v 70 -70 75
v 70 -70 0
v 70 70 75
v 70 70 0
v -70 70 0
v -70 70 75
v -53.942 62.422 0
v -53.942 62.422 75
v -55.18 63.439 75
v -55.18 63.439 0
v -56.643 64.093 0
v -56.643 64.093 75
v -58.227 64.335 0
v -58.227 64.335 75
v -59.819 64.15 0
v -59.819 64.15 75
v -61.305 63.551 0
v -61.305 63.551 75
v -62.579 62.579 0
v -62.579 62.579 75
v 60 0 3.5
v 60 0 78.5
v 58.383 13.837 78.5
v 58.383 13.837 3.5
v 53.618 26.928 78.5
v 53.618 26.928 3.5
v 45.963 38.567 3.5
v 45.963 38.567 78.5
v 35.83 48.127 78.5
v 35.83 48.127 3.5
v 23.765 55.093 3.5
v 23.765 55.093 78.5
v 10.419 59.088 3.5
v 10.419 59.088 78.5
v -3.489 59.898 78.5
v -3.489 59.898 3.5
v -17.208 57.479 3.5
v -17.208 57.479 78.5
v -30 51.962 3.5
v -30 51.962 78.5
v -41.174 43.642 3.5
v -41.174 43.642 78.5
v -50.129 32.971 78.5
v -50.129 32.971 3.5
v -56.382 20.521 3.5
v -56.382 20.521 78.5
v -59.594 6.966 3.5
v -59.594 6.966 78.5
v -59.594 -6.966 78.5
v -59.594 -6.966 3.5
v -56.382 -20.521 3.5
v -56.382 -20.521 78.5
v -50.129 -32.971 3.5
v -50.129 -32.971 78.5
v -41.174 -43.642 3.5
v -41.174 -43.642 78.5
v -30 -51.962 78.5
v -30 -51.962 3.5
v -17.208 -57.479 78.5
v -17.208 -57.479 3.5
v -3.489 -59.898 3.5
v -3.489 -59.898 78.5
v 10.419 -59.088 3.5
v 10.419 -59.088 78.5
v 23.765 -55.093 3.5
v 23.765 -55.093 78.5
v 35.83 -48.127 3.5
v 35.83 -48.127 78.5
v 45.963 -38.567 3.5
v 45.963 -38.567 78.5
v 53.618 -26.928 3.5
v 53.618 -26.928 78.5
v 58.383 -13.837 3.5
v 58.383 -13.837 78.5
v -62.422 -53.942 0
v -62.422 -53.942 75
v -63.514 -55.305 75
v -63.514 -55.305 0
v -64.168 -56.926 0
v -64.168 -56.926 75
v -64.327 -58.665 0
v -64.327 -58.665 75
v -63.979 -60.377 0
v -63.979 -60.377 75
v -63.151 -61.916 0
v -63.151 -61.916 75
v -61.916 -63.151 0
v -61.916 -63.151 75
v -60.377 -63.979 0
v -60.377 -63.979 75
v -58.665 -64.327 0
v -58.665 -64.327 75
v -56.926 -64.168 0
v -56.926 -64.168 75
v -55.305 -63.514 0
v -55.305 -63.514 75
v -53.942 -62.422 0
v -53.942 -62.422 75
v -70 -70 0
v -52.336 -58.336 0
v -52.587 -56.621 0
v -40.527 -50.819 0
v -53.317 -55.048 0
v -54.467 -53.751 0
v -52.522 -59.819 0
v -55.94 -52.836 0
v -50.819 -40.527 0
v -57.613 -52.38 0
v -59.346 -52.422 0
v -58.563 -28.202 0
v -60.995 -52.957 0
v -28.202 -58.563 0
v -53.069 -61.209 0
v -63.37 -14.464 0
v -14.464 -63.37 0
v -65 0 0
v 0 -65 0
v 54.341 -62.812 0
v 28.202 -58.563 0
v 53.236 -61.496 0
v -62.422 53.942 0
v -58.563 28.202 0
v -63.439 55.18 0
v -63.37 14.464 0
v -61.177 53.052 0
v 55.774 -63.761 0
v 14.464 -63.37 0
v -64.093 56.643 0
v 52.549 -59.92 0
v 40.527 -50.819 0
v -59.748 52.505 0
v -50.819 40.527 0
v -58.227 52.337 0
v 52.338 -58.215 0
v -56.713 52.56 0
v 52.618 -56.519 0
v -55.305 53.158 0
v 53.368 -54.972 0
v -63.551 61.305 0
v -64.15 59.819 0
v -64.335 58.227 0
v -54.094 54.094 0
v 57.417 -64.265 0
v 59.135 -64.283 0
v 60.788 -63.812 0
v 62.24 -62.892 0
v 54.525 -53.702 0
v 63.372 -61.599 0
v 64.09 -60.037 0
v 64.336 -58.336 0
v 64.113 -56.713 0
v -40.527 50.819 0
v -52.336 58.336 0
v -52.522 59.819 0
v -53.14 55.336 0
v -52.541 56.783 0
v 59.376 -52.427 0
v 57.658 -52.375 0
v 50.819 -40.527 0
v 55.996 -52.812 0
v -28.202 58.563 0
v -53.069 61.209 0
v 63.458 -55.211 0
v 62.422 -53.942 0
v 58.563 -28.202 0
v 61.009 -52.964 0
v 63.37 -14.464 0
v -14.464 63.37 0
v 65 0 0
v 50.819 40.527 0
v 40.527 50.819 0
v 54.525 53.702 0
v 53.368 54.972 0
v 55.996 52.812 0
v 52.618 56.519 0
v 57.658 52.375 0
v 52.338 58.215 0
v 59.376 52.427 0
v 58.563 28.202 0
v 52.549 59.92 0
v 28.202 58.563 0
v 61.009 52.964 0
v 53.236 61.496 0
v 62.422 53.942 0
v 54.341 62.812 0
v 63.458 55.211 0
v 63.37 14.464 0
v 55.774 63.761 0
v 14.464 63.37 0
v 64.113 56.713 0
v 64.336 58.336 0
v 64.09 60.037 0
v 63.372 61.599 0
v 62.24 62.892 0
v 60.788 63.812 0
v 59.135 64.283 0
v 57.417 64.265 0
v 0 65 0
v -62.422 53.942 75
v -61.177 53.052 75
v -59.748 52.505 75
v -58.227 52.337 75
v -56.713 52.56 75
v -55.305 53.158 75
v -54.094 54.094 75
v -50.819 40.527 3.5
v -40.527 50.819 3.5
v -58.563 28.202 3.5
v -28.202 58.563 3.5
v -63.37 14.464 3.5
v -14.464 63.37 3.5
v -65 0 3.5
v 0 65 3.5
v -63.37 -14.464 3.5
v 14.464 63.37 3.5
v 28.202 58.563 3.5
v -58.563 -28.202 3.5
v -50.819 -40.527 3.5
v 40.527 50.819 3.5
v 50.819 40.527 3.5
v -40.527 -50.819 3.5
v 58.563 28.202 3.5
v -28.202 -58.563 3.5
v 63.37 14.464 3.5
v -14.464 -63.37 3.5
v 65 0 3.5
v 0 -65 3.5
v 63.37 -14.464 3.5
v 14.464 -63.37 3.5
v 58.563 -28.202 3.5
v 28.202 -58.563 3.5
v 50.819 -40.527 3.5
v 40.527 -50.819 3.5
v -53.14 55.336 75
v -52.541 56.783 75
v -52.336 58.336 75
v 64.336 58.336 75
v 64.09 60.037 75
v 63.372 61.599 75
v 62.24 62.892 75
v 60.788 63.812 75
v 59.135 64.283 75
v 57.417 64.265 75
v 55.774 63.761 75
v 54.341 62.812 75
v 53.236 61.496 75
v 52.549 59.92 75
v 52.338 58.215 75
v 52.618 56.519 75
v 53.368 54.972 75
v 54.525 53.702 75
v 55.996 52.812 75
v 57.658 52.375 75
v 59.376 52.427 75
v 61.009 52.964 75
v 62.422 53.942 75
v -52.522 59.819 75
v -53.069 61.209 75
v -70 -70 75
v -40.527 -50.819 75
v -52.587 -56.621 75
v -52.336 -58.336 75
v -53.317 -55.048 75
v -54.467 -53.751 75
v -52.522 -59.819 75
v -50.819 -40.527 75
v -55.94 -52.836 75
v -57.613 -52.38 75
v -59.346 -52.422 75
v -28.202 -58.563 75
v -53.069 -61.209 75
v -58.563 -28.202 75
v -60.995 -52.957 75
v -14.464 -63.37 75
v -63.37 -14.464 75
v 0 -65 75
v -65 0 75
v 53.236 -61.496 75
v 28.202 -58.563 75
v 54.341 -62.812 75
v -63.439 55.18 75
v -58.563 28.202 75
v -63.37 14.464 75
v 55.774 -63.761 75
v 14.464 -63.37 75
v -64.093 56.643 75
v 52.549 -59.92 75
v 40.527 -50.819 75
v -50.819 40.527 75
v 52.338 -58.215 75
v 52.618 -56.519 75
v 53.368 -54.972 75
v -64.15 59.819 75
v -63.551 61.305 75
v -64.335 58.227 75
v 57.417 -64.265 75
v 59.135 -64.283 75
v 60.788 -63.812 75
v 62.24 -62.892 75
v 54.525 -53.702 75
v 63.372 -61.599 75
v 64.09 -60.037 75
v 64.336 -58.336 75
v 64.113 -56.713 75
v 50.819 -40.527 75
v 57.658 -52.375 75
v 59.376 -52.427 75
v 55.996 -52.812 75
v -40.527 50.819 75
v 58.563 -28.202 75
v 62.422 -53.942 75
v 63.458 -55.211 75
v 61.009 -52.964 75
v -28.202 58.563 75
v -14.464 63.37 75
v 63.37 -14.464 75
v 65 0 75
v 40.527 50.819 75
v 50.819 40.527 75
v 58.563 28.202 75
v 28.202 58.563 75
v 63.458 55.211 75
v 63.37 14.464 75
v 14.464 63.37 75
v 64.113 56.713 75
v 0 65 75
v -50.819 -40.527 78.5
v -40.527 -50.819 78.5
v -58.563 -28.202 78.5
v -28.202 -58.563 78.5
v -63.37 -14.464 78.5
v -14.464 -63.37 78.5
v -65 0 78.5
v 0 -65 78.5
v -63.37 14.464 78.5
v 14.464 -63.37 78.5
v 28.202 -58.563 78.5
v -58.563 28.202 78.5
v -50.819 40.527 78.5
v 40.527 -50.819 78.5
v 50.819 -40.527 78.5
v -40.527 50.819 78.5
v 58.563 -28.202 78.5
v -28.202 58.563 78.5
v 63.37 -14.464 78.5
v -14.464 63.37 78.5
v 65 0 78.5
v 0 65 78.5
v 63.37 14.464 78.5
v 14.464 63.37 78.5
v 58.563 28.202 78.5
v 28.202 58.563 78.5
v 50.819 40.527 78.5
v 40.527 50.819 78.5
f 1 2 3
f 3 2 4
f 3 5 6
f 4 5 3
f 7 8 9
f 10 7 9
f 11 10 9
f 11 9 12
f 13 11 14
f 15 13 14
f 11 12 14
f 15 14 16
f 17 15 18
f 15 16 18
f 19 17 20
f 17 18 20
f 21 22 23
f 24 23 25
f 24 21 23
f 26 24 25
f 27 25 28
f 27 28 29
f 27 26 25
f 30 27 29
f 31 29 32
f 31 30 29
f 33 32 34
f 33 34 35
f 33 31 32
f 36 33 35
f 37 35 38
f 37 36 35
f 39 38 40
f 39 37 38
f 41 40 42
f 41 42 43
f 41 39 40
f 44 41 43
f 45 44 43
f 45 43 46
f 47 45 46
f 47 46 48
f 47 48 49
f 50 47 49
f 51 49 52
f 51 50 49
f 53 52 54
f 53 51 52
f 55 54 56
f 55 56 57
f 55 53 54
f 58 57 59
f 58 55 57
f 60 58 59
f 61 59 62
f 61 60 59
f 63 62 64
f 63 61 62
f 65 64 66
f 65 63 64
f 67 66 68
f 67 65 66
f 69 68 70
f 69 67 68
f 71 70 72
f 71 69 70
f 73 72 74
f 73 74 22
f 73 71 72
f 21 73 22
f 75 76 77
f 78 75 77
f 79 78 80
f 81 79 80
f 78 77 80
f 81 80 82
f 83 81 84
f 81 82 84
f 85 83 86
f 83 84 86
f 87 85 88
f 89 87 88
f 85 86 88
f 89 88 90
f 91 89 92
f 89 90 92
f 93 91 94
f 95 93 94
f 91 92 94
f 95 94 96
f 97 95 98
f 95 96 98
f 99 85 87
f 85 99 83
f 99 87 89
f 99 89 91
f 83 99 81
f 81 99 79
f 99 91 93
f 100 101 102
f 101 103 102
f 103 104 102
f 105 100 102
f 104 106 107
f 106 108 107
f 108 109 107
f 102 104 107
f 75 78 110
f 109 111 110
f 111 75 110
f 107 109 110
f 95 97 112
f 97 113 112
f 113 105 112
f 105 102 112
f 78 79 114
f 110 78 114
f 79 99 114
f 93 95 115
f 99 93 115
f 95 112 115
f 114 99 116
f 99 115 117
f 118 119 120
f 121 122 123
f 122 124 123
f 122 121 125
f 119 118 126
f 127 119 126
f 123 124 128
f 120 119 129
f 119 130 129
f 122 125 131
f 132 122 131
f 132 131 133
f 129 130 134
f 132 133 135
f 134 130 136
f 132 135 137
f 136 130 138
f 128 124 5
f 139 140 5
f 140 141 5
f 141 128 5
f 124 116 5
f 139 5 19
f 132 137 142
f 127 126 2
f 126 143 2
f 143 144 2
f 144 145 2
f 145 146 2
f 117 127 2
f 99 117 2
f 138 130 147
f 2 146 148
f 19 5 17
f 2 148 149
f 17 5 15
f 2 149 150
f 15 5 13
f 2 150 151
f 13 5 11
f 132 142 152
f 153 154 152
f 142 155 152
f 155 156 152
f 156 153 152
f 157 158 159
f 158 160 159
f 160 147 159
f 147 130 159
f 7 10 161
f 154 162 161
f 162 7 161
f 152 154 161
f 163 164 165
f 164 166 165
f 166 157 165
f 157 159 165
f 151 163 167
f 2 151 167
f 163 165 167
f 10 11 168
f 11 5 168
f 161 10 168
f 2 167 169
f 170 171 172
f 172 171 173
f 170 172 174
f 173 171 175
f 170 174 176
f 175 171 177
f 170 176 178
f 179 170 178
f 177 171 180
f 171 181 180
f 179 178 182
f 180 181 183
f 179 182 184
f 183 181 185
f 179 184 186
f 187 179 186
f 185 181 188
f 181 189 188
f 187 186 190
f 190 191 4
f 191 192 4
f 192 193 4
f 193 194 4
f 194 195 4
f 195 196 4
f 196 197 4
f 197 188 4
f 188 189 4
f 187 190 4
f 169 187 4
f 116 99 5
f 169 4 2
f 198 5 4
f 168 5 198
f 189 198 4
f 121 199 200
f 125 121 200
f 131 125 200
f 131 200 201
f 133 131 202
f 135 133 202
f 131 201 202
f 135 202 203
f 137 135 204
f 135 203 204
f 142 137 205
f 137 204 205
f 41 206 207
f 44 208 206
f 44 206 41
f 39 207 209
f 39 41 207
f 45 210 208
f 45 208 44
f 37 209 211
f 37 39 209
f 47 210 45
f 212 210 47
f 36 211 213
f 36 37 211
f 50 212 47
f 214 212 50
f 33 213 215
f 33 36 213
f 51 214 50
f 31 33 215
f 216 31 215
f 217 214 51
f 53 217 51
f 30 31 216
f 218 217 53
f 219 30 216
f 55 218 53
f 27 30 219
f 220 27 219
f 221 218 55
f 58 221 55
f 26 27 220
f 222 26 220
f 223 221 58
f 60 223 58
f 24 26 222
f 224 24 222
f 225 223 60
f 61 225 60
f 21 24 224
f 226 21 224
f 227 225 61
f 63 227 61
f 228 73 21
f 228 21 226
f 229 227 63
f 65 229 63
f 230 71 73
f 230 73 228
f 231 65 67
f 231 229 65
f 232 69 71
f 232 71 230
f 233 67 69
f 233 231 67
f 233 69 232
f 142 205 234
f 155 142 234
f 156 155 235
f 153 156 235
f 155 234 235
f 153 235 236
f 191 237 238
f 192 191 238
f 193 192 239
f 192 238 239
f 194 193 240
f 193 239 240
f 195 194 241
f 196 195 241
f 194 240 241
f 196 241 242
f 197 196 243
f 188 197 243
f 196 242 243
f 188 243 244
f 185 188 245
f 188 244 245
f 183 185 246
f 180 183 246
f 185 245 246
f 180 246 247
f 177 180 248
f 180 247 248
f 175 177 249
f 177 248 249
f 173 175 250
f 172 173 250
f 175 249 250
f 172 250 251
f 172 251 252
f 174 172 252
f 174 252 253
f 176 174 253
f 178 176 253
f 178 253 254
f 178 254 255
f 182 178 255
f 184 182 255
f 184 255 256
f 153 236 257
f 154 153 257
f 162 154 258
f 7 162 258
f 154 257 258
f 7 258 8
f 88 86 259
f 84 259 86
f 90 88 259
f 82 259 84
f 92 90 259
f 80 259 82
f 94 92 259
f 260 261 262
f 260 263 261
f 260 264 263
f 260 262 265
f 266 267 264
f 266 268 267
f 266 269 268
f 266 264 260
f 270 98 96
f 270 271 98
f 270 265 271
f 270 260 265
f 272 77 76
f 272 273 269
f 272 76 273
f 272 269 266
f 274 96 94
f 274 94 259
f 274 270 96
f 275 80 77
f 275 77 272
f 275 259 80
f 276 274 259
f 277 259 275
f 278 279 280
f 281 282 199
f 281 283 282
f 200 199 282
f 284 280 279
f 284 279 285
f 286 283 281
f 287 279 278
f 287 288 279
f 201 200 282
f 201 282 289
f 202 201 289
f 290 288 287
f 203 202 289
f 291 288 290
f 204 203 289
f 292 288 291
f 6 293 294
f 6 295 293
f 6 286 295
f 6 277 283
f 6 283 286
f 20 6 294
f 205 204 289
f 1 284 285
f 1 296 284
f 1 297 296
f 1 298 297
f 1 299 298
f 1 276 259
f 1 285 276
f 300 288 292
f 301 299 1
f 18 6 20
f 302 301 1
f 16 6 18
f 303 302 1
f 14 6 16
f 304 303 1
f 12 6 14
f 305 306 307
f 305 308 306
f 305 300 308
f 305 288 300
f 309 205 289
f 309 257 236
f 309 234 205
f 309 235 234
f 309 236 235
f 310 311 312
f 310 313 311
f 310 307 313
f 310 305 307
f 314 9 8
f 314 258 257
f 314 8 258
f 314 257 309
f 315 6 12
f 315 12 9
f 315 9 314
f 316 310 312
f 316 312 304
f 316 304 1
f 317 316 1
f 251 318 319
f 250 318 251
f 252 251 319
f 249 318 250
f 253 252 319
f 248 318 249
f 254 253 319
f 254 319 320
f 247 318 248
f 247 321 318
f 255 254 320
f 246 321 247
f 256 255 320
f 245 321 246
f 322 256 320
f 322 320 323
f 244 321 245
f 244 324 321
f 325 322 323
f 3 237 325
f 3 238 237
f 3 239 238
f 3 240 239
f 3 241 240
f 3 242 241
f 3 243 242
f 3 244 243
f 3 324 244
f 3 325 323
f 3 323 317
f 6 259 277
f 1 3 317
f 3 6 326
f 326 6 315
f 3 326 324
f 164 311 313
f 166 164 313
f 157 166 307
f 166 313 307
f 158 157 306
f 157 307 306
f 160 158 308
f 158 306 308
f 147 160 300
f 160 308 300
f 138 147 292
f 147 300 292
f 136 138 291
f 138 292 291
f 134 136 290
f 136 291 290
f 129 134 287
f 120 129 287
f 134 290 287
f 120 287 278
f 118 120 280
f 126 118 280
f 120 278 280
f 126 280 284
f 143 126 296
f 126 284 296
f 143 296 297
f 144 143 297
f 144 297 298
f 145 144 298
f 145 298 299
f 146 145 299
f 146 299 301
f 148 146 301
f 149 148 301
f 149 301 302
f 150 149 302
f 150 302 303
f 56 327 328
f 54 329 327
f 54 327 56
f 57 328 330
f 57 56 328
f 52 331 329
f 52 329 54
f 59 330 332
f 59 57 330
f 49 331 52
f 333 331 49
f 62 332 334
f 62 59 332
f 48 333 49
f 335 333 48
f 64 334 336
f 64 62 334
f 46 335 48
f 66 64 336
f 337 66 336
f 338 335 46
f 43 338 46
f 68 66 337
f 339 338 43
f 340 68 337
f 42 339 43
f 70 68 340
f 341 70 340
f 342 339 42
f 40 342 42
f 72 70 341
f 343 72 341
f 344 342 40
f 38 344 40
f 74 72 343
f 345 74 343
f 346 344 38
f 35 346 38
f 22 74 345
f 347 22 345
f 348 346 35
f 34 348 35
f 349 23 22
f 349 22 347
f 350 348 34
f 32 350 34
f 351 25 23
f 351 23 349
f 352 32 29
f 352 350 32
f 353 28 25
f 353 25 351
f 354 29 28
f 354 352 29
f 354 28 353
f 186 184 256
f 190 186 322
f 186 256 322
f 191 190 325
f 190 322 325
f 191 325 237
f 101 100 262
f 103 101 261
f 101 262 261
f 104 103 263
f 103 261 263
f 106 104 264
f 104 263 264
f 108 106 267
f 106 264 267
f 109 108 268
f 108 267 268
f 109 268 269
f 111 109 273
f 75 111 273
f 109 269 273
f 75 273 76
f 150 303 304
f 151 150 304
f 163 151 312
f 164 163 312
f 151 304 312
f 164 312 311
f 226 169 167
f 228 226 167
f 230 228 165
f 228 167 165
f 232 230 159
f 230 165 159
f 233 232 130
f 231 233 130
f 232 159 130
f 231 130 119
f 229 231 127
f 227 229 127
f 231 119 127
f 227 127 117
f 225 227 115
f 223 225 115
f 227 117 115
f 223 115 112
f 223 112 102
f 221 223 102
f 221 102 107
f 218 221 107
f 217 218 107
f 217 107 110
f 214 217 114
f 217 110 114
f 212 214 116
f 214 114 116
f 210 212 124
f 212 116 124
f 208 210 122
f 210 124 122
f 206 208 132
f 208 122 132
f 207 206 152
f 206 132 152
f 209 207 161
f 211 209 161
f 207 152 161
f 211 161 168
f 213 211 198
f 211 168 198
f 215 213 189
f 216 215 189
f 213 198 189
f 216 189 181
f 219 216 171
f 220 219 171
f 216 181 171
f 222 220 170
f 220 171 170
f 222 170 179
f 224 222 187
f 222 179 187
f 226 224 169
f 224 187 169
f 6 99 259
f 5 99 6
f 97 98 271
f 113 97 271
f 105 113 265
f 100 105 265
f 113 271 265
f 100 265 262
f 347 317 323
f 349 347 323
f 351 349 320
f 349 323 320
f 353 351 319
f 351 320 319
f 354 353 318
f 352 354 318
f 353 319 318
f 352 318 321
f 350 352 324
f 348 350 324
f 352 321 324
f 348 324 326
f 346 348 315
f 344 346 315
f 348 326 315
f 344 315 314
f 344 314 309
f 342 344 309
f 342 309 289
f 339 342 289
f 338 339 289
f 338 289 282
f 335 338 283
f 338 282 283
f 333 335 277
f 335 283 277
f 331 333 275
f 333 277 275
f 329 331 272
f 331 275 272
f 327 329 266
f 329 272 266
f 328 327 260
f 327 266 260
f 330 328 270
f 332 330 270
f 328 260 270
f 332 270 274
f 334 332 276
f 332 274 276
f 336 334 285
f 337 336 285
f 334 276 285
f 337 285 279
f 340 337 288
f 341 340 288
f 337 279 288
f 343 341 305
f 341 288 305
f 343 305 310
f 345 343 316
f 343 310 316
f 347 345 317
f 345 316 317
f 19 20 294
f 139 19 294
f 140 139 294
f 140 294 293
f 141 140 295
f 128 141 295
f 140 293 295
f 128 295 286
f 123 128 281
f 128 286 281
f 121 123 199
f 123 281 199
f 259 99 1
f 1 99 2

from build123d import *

# Parameters (mm, degrees)
F0_W     = 140
F0_H     = 140
F0_R     = 60
F1_DEPTH = 75
F2_R     = 65
F2_R_2   = 60
F3_DEPTH = 3.5
F4_R     = 65
F4_R_2   = 50
F5_DEPTH = 3.5
F7_DEPTH = 75.001


with BuildPart() as f1:
    # F0 (on Top) → F1 (new body)
    with BuildSketch(Plane.XY):
        Rectangle(F0_W, F0_H)
        Circle(F0_R, mode=Mode.SUBTRACT)
    extrude(amount=F1_DEPTH)

    # F2 (on face) → F3 (join)
    with BuildSketch(Plane.XY.offset(75)):
        Circle(F2_R)
        Circle(F2_R_2, mode=Mode.SUBTRACT)
    extrude(amount=F3_DEPTH)

    # F4 (on face) → F5 (cut)
    with BuildSketch(Plane(origin=(0, 0, 0), x_dir=(1, 0, 0), z_dir=(0, 0, -1))):
        Circle(F4_R)
        Circle(F4_R_2, mode=Mode.SUBTRACT)
    extrude(amount=-F5_DEPTH, mode=Mode.SUBTRACT)

    # F6 (on face) → F7 (cut, through all)
    with BuildSketch(Plane.XY.offset(75)):
        with BuildLine():
            ThreePointArc((-58.3363094479, 58.3363094479), (-56.1764068849, 60.419047572), (-53.9421968972, 62.4218663122))
            ThreePointArc((-53.9421968972, 62.4218663122), (-58.2272004968, 64.3353173023), (-62.578950135, 62.578950135))
            Line((-62.578950135, 62.578950135), (-58.3363094479, 58.3363094479))
        make_face()
        with BuildLine():
            ThreePointArc((-52.3363094479, 58.3363094479), (-52.752194688, 60.5312268377), (-53.9421968972, 62.4218663122))
            ThreePointArc((-53.9421968972, 62.4218663122), (-56.1764068849, 60.419047572), (-58.3363094479, 58.3363094479))
            Line((-58.3363094479, 58.3363094479), (-54.0936687608, 54.0936687608))
            ThreePointArc((-54.0936687608, 54.0936687608), (-52.7930322528, 56.0402088537), (-52.3363094479, 58.3363094479))
        make_face()
        with BuildLine():
            Line((-54.0936687608, 54.0936687608), (-58.3363094479, 58.3363094479))
            ThreePointArc((-58.3363094479, 58.3363094479), (-60.419047572, 56.1764068849), (-62.4218663122, 53.9421968972))
            ThreePointArc((-62.4218663122, 53.9421968972), (-58.2272004968, 52.3373015935), (-54.0936687608, 54.0936687608))
        make_face()
        with BuildLine():
            ThreePointArc((-62.4218663122, 53.9421968972), (-60.419047572, 56.1764068849), (-58.3363094479, 58.3363094479))
            Line((-58.3363094479, 58.3363094479), (-62.578950135, 62.578950135))
            ThreePointArc((-62.578950135, 62.578950135), (-64.3353173023, 58.2272004968), (-62.4218663122, 53.9421968972))
        make_face()
        with BuildLine():
            ThreePointArc((53.9421968972, 62.4218663122), (58.3363094479, 58.3363094479), (62.4218663122, 53.9421968972))
            ThreePointArc((62.4218663122, 53.9421968972), (63.836915832, 55.9397850047), (64.3363094479, 58.3363094479))
            ThreePointArc((64.3363094479, 58.3363094479), (60.5312268377, 63.9204242078), (53.9421968972, 62.4218663122))
        make_face()
        with BuildLine():
            ThreePointArc((53.9421968972, 62.4218663122), (54.0936687608, 54.0936687608), (62.4218663122, 53.9421968972))
            ThreePointArc((62.4218663122, 53.9421968972), (58.3363094479, 58.3363094479), (53.9421968972, 62.4218663122))
        make_face()
        with BuildLine():
            ThreePointArc((64.3363094479, -58.3363094479), (63.836915832, -55.9397850047), (62.4218663122, -53.9421968972))
            ThreePointArc((62.4218663122, -53.9421968972), (58.3363094479, -58.3363094479), (53.9421968972, -62.4218663122))
            ThreePointArc((53.9421968972, -62.4218663122), (60.5312268377, -63.9204242078), (64.3363094479, -58.3363094479))
        make_face()
        with BuildLine():
            ThreePointArc((53.9421968972, -62.4218663122), (58.3363094479, -58.3363094479), (62.4218663122, -53.9421968972))
            ThreePointArc((62.4218663122, -53.9421968972), (54.0936687608, -54.0936687608), (53.9421968972, -62.4218663122))
        make_face()
        with BuildLine():
            ThreePointArc((-62.4218663122, -53.9421968972), (-62.578950135, -62.578950135), (-53.9421968972, -62.4218663122))
            ThreePointArc((-53.9421968972, -62.4218663122), (-58.3363094479, -58.3363094479), (-62.4218663122, -53.9421968972))
        make_face()
        with BuildLine():
            ThreePointArc((-62.4218663122, -53.9421968972), (-58.3363094479, -58.3363094479), (-53.9421968972, -62.4218663122))
            ThreePointArc((-53.9421968972, -62.4218663122), (-52.752194688, -60.5312268377), (-52.3363094479, -58.3363094479))
            ThreePointArc((-52.3363094479, -58.3363094479), (-55.9397850047, -52.8357030638), (-62.4218663122, -53.9421968972))
        make_face()
    extrude(amount=-F7_DEPTH, mode=Mode.SUBTRACT)


solid = f1.part
